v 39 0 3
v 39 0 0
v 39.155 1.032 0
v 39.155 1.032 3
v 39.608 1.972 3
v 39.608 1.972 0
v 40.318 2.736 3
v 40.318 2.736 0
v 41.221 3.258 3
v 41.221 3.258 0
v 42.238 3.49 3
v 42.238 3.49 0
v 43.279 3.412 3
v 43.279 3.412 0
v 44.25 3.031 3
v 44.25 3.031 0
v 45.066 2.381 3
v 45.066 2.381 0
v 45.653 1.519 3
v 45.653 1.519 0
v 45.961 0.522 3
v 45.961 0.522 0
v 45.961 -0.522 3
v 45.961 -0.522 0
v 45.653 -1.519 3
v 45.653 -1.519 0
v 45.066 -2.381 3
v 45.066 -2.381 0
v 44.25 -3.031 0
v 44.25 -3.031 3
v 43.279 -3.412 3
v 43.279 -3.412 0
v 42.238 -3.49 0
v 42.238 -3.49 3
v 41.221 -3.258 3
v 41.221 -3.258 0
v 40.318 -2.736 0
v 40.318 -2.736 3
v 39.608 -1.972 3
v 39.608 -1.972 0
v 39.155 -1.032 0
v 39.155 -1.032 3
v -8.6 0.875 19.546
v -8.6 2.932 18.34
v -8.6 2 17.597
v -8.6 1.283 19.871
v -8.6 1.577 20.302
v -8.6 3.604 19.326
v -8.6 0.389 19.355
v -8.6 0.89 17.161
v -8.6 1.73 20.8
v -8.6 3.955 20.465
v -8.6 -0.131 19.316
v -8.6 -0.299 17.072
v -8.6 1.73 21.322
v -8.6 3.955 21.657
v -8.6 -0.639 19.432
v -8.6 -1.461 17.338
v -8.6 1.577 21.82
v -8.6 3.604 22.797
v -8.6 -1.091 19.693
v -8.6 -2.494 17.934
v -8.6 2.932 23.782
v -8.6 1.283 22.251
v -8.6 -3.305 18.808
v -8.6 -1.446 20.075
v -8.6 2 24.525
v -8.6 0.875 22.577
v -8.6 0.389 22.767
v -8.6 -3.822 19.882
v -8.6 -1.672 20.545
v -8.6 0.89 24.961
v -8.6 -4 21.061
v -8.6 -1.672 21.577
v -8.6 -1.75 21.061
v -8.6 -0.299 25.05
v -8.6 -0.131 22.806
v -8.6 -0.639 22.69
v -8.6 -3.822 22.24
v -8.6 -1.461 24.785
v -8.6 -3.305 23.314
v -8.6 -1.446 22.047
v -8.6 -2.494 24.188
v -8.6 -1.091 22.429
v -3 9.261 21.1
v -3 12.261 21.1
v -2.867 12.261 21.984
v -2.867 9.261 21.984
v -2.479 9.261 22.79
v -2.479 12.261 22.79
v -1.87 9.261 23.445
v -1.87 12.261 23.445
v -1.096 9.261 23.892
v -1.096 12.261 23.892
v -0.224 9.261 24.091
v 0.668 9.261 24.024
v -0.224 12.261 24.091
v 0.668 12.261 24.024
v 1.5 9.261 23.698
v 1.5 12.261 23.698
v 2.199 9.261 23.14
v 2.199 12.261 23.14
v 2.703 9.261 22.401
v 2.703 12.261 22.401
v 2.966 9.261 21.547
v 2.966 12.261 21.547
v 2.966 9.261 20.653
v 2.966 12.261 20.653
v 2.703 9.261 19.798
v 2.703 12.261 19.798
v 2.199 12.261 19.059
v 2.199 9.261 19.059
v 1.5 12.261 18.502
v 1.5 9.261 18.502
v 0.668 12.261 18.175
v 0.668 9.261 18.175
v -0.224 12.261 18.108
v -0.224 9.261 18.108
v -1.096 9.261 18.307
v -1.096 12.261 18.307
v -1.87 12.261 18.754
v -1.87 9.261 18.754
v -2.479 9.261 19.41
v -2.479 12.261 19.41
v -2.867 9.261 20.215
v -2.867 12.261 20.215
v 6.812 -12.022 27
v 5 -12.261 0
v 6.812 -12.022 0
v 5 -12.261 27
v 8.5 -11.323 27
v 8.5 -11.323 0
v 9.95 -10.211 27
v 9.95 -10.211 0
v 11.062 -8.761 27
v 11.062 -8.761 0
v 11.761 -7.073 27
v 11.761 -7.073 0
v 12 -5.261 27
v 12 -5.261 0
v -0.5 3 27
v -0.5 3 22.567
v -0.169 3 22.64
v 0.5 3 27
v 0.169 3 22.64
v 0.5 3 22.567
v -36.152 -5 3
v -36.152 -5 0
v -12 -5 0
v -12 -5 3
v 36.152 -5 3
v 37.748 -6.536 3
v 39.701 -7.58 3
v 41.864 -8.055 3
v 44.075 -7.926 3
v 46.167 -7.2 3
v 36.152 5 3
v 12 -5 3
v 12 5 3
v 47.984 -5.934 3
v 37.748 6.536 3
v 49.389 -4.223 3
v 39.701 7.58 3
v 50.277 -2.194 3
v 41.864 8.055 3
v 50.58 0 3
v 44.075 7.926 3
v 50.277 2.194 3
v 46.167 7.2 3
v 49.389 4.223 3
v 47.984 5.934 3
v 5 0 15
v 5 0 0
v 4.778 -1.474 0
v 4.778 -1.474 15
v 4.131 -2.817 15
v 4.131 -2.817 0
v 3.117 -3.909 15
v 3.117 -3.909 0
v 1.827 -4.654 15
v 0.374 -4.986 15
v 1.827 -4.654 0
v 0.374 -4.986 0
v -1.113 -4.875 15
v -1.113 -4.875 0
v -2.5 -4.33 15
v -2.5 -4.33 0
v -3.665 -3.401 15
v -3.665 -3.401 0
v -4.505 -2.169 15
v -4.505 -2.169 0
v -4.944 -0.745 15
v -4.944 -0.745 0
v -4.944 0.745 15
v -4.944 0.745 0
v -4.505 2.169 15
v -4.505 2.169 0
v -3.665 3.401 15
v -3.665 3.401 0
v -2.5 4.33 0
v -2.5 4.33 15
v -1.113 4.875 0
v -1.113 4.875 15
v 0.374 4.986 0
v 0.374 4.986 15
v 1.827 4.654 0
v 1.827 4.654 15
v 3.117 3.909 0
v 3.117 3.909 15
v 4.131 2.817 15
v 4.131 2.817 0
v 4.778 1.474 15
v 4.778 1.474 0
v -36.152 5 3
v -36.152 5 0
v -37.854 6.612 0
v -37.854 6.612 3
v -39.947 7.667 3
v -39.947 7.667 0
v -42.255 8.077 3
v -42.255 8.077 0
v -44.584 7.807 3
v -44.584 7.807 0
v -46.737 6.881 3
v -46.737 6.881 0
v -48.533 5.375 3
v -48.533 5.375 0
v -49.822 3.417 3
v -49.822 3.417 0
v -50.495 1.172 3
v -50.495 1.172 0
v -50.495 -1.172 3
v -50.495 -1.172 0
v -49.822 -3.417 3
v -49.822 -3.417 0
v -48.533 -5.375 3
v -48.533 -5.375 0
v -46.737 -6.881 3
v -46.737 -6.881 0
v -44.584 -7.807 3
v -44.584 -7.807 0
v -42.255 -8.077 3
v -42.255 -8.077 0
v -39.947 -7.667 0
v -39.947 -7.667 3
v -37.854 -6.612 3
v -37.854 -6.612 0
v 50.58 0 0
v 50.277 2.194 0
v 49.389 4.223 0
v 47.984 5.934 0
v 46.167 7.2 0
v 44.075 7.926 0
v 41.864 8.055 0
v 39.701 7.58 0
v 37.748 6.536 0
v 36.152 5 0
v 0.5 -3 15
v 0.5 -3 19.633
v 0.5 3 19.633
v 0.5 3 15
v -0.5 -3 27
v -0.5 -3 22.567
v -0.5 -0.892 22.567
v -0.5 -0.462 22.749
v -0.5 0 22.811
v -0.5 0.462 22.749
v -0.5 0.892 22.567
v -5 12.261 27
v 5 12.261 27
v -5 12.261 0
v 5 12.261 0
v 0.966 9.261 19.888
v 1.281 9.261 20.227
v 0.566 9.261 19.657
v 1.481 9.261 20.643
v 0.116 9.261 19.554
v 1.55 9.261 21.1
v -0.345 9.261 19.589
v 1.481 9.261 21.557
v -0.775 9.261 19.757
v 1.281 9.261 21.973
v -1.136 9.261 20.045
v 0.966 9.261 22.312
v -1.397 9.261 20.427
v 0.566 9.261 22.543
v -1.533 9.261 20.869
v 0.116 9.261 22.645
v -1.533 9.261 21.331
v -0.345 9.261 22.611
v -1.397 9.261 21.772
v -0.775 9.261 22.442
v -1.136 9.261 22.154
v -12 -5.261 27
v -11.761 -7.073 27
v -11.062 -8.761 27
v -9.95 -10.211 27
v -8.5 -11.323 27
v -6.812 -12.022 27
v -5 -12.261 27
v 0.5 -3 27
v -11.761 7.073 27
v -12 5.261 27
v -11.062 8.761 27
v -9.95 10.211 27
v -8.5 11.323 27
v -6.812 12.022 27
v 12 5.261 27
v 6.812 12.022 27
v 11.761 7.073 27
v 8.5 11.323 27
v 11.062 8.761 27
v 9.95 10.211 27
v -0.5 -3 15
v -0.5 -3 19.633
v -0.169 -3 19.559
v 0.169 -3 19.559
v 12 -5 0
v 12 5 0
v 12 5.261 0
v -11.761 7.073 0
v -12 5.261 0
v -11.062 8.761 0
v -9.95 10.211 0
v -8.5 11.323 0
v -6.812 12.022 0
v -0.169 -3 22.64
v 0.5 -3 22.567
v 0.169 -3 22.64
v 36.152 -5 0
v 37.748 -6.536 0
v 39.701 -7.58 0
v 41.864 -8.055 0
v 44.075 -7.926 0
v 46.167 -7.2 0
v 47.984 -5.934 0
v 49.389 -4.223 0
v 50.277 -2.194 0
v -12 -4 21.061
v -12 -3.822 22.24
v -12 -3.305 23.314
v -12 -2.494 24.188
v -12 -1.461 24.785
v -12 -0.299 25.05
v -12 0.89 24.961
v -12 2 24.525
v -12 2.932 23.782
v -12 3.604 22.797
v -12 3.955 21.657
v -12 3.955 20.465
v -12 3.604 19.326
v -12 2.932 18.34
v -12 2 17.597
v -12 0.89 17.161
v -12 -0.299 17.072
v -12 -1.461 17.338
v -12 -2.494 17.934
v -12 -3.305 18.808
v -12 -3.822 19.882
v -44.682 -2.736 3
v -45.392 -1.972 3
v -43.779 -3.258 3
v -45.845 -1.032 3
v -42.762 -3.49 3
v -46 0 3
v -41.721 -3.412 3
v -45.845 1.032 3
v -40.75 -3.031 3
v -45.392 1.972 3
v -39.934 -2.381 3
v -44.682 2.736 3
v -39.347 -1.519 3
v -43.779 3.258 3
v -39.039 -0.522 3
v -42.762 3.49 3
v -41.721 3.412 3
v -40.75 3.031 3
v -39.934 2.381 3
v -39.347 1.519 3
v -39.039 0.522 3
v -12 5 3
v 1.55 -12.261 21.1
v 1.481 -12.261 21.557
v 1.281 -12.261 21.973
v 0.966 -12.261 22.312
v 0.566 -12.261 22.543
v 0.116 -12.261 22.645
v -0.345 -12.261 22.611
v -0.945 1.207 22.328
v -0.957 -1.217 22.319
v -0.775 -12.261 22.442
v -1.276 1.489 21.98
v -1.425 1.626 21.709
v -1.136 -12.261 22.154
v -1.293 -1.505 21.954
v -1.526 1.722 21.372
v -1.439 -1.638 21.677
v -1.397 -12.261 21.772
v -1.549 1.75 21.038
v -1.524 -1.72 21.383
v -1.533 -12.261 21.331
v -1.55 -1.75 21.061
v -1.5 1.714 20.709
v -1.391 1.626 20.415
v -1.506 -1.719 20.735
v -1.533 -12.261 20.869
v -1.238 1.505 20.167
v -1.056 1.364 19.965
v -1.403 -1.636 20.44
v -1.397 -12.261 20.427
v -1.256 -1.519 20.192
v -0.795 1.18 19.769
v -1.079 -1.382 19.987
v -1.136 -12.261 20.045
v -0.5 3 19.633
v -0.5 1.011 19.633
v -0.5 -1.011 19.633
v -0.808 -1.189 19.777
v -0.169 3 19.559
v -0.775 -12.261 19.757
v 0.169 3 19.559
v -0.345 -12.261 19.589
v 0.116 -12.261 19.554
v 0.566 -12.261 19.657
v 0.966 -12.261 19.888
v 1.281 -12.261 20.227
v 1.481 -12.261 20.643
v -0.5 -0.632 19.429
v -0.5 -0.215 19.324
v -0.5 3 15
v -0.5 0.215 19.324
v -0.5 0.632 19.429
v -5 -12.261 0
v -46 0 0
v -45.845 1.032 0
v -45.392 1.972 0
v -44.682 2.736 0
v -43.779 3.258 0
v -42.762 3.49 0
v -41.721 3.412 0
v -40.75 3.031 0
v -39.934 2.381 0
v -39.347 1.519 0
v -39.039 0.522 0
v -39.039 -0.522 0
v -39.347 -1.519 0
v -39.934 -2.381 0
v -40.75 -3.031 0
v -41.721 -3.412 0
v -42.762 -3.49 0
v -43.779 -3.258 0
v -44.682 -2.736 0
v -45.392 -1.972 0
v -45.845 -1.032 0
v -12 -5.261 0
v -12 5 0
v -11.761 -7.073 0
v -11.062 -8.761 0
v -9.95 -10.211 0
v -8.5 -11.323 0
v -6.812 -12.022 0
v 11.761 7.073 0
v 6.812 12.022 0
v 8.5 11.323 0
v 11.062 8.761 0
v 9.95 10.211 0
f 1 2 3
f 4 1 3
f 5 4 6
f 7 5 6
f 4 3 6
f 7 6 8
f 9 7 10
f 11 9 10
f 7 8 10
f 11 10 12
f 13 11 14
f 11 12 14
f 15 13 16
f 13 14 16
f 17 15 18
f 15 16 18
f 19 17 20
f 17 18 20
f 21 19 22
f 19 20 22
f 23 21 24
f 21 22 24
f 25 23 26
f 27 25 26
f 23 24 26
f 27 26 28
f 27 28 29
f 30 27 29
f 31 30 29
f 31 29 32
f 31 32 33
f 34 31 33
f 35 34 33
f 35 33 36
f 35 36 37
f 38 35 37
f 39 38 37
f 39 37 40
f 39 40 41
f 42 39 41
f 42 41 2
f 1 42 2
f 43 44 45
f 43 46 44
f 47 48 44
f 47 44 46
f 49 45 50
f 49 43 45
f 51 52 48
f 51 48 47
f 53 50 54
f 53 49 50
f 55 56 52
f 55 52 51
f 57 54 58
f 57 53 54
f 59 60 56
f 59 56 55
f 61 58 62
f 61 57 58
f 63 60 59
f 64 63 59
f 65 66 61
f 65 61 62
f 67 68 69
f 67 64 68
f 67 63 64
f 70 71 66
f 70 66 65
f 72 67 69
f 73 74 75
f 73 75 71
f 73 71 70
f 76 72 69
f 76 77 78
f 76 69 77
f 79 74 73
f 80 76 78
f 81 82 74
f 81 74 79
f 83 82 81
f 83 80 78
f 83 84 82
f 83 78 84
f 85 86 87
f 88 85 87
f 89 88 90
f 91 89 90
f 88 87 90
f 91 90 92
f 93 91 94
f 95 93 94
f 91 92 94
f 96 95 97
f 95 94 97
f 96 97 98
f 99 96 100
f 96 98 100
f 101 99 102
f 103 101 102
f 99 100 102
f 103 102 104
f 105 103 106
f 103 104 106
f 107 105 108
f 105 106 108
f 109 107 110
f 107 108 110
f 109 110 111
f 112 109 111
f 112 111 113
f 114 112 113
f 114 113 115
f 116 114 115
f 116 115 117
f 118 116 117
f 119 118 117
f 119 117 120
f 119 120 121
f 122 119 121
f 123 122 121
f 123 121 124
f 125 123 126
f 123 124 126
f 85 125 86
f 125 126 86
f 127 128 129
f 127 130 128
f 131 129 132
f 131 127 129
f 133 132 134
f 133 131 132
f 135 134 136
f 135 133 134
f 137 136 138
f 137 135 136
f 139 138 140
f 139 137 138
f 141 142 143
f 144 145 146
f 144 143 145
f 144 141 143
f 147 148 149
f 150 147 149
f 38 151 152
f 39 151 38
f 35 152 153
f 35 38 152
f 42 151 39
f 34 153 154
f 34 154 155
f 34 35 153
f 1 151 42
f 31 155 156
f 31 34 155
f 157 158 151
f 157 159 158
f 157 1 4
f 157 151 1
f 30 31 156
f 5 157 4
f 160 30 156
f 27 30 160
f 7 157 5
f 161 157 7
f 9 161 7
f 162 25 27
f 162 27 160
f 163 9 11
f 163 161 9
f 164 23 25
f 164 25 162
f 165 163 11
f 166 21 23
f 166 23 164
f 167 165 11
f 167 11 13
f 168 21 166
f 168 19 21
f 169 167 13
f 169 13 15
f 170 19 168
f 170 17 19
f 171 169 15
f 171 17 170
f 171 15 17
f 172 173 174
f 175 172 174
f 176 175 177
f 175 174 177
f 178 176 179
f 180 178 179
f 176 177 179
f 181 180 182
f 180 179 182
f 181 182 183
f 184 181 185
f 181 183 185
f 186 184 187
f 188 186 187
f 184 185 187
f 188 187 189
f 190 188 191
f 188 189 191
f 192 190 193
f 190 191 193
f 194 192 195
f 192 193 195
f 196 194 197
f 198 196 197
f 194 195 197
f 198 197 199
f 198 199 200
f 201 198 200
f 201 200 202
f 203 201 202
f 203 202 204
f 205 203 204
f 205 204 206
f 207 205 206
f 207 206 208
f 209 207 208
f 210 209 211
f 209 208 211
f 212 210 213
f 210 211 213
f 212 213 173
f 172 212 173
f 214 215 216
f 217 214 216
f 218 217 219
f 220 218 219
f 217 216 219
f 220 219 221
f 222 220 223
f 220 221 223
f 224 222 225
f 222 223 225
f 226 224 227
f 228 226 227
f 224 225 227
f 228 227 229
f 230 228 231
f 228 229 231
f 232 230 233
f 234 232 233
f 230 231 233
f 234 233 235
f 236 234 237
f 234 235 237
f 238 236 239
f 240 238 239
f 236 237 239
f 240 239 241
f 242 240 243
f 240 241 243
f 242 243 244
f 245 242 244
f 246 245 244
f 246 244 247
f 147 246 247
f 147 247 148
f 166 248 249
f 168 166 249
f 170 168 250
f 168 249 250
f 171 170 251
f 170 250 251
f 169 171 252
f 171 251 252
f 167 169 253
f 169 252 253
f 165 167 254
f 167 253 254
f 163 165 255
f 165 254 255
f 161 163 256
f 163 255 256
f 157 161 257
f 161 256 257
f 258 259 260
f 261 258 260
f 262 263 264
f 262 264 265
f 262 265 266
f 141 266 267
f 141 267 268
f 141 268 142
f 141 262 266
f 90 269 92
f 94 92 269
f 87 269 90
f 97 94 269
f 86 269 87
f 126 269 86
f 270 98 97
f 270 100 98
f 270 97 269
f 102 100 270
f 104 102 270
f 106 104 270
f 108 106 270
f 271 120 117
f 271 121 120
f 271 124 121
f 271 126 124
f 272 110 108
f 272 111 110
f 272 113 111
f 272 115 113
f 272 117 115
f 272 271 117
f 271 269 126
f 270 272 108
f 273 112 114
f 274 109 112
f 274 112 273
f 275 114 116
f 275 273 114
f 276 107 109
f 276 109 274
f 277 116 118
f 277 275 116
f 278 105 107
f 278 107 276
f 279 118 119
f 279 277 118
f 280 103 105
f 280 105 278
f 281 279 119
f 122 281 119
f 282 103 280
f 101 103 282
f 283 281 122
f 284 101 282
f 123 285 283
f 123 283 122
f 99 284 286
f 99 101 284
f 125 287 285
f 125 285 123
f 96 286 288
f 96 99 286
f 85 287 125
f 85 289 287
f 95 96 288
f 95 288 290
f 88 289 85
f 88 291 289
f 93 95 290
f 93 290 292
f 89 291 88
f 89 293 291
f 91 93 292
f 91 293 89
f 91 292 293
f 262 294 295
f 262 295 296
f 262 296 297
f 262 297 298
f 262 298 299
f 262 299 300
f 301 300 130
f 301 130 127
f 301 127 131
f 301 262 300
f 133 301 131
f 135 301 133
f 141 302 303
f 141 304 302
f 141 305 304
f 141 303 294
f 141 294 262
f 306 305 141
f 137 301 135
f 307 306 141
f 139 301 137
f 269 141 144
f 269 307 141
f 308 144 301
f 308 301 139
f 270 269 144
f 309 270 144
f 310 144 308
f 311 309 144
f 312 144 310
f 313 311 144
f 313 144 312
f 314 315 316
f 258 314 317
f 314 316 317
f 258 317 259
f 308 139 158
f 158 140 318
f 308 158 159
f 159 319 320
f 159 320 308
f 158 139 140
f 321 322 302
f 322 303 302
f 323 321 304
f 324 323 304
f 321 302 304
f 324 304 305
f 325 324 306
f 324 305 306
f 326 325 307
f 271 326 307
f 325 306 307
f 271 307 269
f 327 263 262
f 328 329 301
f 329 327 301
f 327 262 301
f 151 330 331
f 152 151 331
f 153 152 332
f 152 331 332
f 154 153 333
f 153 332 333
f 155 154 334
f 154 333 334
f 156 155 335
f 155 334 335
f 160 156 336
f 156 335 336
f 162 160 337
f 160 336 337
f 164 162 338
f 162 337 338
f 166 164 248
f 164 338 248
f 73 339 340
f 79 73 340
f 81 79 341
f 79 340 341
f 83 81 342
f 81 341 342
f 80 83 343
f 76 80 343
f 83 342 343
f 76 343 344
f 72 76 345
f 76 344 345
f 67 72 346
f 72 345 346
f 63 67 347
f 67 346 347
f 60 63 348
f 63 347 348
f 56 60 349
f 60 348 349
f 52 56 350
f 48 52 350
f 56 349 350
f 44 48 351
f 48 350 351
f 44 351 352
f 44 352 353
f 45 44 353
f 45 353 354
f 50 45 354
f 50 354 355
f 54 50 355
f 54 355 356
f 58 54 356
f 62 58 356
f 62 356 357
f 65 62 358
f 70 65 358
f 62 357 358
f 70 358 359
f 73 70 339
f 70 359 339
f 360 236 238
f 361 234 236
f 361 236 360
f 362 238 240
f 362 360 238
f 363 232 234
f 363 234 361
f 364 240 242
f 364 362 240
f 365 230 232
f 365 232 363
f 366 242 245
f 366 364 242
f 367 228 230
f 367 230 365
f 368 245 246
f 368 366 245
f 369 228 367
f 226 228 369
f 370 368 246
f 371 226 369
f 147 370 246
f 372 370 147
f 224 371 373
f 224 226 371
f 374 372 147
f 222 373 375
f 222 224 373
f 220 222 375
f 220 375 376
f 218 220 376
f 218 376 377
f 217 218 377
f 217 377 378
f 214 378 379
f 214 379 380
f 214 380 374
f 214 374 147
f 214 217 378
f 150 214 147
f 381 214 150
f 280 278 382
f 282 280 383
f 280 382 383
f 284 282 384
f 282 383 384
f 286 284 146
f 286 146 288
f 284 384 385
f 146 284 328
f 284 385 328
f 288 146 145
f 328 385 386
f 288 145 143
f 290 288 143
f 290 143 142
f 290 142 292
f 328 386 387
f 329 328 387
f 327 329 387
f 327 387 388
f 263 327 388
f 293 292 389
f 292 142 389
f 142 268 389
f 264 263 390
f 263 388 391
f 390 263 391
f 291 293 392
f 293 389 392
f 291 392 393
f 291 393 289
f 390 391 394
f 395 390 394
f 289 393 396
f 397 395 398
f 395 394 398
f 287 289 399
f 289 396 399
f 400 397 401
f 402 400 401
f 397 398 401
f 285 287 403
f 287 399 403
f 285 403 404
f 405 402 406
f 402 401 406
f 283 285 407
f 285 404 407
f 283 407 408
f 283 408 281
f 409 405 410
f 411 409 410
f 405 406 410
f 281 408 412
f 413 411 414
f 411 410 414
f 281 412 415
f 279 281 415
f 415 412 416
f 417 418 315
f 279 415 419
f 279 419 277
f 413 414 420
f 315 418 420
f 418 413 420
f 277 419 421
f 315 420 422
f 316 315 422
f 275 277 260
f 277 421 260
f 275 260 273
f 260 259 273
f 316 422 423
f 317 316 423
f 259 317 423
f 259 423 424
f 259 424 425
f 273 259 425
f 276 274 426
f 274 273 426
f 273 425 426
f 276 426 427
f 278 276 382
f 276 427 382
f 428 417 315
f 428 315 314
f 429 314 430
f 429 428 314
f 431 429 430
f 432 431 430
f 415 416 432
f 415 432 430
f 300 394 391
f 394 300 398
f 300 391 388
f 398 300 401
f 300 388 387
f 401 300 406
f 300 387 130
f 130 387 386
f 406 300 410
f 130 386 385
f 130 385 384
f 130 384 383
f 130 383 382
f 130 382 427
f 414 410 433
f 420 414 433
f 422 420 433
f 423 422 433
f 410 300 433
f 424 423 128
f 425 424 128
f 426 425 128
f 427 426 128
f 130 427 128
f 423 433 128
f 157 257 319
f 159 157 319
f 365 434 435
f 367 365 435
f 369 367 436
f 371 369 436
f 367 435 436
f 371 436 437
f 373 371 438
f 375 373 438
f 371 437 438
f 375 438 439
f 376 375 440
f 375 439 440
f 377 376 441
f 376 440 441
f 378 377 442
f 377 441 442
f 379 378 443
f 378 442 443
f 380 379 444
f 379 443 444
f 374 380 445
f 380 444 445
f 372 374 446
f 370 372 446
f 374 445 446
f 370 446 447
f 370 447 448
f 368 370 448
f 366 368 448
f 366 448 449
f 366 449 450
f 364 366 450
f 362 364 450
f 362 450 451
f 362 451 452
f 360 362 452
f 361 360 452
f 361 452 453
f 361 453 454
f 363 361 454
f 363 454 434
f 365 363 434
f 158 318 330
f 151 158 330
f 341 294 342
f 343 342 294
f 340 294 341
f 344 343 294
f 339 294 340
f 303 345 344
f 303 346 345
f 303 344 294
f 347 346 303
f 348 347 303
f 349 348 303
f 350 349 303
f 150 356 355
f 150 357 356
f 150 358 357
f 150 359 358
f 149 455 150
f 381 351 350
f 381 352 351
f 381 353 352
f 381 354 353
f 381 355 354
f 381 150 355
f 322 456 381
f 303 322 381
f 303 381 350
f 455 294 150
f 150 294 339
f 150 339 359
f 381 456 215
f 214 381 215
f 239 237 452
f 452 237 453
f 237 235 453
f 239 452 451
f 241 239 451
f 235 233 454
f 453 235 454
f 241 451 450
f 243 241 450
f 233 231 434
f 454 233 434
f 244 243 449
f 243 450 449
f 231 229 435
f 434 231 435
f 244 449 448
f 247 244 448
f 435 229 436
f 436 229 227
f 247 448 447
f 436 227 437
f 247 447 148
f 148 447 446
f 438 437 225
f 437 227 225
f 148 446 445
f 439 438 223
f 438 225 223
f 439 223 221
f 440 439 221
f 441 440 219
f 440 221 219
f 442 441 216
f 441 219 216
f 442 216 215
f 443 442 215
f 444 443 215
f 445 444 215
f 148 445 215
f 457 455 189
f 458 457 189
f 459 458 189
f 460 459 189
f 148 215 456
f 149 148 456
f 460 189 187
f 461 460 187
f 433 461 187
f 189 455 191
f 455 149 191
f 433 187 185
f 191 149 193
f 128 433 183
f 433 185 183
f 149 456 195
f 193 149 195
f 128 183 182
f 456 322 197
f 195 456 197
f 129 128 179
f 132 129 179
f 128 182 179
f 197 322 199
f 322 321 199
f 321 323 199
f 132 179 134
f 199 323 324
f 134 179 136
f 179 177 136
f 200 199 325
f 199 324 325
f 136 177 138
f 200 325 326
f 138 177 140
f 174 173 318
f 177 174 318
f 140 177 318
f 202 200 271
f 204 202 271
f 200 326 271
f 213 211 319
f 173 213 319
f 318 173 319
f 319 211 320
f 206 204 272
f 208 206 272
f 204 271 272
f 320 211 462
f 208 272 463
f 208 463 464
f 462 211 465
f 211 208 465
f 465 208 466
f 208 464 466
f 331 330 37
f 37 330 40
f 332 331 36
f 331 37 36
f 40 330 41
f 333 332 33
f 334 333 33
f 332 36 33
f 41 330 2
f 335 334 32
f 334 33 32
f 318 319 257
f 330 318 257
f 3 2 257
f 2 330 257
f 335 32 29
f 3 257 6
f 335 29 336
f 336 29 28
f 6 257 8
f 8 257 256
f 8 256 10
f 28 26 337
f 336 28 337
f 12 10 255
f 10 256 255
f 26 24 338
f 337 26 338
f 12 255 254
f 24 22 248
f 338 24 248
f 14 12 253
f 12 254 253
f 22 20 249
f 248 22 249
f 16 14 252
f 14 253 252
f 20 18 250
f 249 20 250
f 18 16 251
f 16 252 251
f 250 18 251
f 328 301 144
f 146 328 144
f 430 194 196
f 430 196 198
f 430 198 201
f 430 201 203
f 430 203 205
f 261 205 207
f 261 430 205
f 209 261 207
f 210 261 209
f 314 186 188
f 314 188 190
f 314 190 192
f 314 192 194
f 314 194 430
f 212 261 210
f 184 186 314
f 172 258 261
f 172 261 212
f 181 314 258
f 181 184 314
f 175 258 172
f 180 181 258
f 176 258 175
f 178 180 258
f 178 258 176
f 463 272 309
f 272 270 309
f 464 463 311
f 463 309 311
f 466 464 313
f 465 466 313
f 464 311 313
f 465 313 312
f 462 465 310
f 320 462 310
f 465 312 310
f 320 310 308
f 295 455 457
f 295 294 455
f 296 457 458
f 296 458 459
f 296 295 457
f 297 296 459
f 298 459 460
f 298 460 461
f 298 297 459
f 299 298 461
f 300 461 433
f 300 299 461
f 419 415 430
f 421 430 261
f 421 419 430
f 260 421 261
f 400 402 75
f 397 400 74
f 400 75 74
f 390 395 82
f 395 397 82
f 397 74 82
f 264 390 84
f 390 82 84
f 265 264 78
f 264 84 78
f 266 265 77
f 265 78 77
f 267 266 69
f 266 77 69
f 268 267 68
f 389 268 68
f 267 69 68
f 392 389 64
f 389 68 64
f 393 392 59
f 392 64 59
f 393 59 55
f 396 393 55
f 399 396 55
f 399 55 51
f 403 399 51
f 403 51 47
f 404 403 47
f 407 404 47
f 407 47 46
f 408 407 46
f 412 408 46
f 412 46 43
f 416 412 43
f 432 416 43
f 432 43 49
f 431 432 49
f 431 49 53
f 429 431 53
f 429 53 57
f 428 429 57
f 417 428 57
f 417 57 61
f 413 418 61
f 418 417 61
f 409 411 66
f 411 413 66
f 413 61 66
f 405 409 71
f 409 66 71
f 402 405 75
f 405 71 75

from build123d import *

# Parameters (mm, degrees)
F1_DEPTH  = 3
F3_D      = 7
F4_W      = 24
F4_H      = 24.5219291974
F5_DEPTH  = 27
F6_R      = 1.55
F7_DEPTH  = 12.5
F8_R      = 1.75
F9_DEPTH  = 12
F10_R     = 4
F11_DEPTH = 3.4
F12_R     = 7
F13_R     = 7
F14_R     = 7
F15_R     = 7
F16_W     = 1
F16_H     = 6
F17_DEPTH = 14
F18_R     = 5
F19_DEPTH = 15
F20_R     = 3
F20_R_2   = 1.55
F21_DEPTH = 3


with BuildPart() as f1:
    # F0 (on Top) → F1 (new body)
    with BuildSketch(Plane.XY):
        with BuildLine():
            Line((42.5, 5), (42.5, -5))
            Line((42.5, -5), (36.1522351233, -5))
            ThreePointArc((36.1522351233, -5), (45.1458596679, -7.635020992), (50.5804776424, 0))
            ThreePointArc((50.5804776424, 0), (45.1458596679, 7.635020992), (36.1522351233, 5))
            Line((36.1522351233, 5), (42.5, 5))
        make_face()
        with BuildLine():
            ThreePointArc((-36.1522351233, 5), (-50.5804776424, 0), (-36.1522351233, -5))
            Line((-36.1522351233, -5), (-42.5, -5))
            Line((-42.5, -5), (-42.5, 5))
            Line((-42.5, 5), (-36.1522351233, 5))
        make_face()
        with BuildLine():
            Line((36.1522351233, -5), (42.5, -5))
            Line((42.5, -5), (42.5, 5))
            Line((42.5, 5), (36.1522351233, 5))
            ThreePointArc((36.1522351233, 5), (34.4195223576, 0), (36.1522351233, -5))
        make_face()
        with BuildLine():
            Line((-36.1522351233, -5), (36.1522351233, -5))
            ThreePointArc((36.1522351233, -5), (34.4195223576, 0), (36.1522351233, 5))
            Line((36.1522351233, 5), (-36.1522351233, 5))
            ThreePointArc((-36.1522351233, 5), (-34.864979008, 2.6458596679), (-34.4195223576, 0))
            ThreePointArc((-34.4195223576, 0), (-34.864979008, -2.6458596679), (-36.1522351233, -5))
        make_face()
        with BuildLine():
            Line((-42.5, -5), (-36.1522351233, -5))
            ThreePointArc((-36.1522351233, -5), (-34.864979008, -2.6458596679), (-34.4195223576, 0))
            ThreePointArc((-34.4195223576, 0), (-34.864979008, 2.6458596679), (-36.1522351233, 5))
            Line((-36.1522351233, 5), (-42.5, 5))
            Line((-42.5, 5), (-42.5, -5))
        make_face()
    extrude(amount=F1_DEPTH)

    # F3 (through all)
    with Locations(Plane.XY.offset(3)):
        with Locations((-42.5, 0), (42.5, 0)):
            Hole(F3_D / 2)

    # F4 (on Top) → F5 (join)
    with BuildSketch(Plane.XY):
        Rectangle(F4_W, F4_H)
    extrude(amount=F5_DEPTH)

    # F6 (on Front) → F7 (cut, symmetric)
    with BuildSketch(Plane.XZ):
        with Locations((0, 21.0996698588)):
            Circle(F6_R)
    extrude(amount=F7_DEPTH, both=True, mode=Mode.SUBTRACT)

    # F8 (on face) → F9 (cut)
    with BuildSketch(Plane(origin=(-12, 0, 0), x_dir=(0, -1, 0), z_dir=(-1, 0, 0))):
        with Locations((0, 21.061129868)):
            Circle(F8_R)
    extrude(amount=-F9_DEPTH, mode=Mode.SUBTRACT)

    # F10 (on face) → F11 (cut)
    with BuildSketch(Plane(origin=(-12, 0, 0), x_dir=(0, -1, 0), z_dir=(-1, 0, 0))):
        with Locations((0, 21.061129868)):
            Circle(F10_R)
    extrude(amount=-F11_DEPTH, mode=Mode.SUBTRACT)

    # F12
    f12_edges = [f1.edges().sort_by_distance(p)[0] for p in [
        (-12, 12.260965, 13.5),
    ]]
    fillet(f12_edges, radius=F12_R)

    # F13
    f13_edges = [f1.edges().sort_by_distance(p)[0] for p in [
        (12, 12.260965, 13.5),
    ]]
    fillet(f13_edges, radius=F13_R)

    # F14
    f14_edges = [f1.edges().sort_by_distance(p)[0] for p in [
        (-12, -12.260965, 13.5),
    ]]
    fillet(f14_edges, radius=F14_R)

    # F15
    f15_edges = [f1.edges().sort_by_distance(p)[0] for p in [
        (12, -12.260965, 13.5),
    ]]
    fillet(f15_edges, radius=F15_R)

    # F16 (on face) → F17 (cut)
    with BuildSketch(Plane.XY.offset(27)):
        Rectangle(F16_W, F16_H)
    extrude(amount=-F17_DEPTH, mode=Mode.SUBTRACT)

    # F18 (on face) → F19 (cut)
    with BuildSketch(Plane(origin=(0, 0, 0), x_dir=(1, 0, 0), z_dir=(0, 0, -1))):
        Circle(F18_R)
    extrude(amount=-F19_DEPTH, mode=Mode.SUBTRACT)

    # F20 (on face) → F21 (cut)
    with BuildSketch(Plane(origin=(0, 12.2609645987, 0), x_dir=(-1, 0, 0), z_dir=(0, 1, 0))):
        with Locations((0, 21.0996698588)):
            Circle(F20_R)
        with Locations((0, 21.0996698588)):
            Circle(F20_R_2, mode=Mode.SUBTRACT)
    extrude(amount=-F21_DEPTH, mode=Mode.SUBTRACT)


solid = f1.part
